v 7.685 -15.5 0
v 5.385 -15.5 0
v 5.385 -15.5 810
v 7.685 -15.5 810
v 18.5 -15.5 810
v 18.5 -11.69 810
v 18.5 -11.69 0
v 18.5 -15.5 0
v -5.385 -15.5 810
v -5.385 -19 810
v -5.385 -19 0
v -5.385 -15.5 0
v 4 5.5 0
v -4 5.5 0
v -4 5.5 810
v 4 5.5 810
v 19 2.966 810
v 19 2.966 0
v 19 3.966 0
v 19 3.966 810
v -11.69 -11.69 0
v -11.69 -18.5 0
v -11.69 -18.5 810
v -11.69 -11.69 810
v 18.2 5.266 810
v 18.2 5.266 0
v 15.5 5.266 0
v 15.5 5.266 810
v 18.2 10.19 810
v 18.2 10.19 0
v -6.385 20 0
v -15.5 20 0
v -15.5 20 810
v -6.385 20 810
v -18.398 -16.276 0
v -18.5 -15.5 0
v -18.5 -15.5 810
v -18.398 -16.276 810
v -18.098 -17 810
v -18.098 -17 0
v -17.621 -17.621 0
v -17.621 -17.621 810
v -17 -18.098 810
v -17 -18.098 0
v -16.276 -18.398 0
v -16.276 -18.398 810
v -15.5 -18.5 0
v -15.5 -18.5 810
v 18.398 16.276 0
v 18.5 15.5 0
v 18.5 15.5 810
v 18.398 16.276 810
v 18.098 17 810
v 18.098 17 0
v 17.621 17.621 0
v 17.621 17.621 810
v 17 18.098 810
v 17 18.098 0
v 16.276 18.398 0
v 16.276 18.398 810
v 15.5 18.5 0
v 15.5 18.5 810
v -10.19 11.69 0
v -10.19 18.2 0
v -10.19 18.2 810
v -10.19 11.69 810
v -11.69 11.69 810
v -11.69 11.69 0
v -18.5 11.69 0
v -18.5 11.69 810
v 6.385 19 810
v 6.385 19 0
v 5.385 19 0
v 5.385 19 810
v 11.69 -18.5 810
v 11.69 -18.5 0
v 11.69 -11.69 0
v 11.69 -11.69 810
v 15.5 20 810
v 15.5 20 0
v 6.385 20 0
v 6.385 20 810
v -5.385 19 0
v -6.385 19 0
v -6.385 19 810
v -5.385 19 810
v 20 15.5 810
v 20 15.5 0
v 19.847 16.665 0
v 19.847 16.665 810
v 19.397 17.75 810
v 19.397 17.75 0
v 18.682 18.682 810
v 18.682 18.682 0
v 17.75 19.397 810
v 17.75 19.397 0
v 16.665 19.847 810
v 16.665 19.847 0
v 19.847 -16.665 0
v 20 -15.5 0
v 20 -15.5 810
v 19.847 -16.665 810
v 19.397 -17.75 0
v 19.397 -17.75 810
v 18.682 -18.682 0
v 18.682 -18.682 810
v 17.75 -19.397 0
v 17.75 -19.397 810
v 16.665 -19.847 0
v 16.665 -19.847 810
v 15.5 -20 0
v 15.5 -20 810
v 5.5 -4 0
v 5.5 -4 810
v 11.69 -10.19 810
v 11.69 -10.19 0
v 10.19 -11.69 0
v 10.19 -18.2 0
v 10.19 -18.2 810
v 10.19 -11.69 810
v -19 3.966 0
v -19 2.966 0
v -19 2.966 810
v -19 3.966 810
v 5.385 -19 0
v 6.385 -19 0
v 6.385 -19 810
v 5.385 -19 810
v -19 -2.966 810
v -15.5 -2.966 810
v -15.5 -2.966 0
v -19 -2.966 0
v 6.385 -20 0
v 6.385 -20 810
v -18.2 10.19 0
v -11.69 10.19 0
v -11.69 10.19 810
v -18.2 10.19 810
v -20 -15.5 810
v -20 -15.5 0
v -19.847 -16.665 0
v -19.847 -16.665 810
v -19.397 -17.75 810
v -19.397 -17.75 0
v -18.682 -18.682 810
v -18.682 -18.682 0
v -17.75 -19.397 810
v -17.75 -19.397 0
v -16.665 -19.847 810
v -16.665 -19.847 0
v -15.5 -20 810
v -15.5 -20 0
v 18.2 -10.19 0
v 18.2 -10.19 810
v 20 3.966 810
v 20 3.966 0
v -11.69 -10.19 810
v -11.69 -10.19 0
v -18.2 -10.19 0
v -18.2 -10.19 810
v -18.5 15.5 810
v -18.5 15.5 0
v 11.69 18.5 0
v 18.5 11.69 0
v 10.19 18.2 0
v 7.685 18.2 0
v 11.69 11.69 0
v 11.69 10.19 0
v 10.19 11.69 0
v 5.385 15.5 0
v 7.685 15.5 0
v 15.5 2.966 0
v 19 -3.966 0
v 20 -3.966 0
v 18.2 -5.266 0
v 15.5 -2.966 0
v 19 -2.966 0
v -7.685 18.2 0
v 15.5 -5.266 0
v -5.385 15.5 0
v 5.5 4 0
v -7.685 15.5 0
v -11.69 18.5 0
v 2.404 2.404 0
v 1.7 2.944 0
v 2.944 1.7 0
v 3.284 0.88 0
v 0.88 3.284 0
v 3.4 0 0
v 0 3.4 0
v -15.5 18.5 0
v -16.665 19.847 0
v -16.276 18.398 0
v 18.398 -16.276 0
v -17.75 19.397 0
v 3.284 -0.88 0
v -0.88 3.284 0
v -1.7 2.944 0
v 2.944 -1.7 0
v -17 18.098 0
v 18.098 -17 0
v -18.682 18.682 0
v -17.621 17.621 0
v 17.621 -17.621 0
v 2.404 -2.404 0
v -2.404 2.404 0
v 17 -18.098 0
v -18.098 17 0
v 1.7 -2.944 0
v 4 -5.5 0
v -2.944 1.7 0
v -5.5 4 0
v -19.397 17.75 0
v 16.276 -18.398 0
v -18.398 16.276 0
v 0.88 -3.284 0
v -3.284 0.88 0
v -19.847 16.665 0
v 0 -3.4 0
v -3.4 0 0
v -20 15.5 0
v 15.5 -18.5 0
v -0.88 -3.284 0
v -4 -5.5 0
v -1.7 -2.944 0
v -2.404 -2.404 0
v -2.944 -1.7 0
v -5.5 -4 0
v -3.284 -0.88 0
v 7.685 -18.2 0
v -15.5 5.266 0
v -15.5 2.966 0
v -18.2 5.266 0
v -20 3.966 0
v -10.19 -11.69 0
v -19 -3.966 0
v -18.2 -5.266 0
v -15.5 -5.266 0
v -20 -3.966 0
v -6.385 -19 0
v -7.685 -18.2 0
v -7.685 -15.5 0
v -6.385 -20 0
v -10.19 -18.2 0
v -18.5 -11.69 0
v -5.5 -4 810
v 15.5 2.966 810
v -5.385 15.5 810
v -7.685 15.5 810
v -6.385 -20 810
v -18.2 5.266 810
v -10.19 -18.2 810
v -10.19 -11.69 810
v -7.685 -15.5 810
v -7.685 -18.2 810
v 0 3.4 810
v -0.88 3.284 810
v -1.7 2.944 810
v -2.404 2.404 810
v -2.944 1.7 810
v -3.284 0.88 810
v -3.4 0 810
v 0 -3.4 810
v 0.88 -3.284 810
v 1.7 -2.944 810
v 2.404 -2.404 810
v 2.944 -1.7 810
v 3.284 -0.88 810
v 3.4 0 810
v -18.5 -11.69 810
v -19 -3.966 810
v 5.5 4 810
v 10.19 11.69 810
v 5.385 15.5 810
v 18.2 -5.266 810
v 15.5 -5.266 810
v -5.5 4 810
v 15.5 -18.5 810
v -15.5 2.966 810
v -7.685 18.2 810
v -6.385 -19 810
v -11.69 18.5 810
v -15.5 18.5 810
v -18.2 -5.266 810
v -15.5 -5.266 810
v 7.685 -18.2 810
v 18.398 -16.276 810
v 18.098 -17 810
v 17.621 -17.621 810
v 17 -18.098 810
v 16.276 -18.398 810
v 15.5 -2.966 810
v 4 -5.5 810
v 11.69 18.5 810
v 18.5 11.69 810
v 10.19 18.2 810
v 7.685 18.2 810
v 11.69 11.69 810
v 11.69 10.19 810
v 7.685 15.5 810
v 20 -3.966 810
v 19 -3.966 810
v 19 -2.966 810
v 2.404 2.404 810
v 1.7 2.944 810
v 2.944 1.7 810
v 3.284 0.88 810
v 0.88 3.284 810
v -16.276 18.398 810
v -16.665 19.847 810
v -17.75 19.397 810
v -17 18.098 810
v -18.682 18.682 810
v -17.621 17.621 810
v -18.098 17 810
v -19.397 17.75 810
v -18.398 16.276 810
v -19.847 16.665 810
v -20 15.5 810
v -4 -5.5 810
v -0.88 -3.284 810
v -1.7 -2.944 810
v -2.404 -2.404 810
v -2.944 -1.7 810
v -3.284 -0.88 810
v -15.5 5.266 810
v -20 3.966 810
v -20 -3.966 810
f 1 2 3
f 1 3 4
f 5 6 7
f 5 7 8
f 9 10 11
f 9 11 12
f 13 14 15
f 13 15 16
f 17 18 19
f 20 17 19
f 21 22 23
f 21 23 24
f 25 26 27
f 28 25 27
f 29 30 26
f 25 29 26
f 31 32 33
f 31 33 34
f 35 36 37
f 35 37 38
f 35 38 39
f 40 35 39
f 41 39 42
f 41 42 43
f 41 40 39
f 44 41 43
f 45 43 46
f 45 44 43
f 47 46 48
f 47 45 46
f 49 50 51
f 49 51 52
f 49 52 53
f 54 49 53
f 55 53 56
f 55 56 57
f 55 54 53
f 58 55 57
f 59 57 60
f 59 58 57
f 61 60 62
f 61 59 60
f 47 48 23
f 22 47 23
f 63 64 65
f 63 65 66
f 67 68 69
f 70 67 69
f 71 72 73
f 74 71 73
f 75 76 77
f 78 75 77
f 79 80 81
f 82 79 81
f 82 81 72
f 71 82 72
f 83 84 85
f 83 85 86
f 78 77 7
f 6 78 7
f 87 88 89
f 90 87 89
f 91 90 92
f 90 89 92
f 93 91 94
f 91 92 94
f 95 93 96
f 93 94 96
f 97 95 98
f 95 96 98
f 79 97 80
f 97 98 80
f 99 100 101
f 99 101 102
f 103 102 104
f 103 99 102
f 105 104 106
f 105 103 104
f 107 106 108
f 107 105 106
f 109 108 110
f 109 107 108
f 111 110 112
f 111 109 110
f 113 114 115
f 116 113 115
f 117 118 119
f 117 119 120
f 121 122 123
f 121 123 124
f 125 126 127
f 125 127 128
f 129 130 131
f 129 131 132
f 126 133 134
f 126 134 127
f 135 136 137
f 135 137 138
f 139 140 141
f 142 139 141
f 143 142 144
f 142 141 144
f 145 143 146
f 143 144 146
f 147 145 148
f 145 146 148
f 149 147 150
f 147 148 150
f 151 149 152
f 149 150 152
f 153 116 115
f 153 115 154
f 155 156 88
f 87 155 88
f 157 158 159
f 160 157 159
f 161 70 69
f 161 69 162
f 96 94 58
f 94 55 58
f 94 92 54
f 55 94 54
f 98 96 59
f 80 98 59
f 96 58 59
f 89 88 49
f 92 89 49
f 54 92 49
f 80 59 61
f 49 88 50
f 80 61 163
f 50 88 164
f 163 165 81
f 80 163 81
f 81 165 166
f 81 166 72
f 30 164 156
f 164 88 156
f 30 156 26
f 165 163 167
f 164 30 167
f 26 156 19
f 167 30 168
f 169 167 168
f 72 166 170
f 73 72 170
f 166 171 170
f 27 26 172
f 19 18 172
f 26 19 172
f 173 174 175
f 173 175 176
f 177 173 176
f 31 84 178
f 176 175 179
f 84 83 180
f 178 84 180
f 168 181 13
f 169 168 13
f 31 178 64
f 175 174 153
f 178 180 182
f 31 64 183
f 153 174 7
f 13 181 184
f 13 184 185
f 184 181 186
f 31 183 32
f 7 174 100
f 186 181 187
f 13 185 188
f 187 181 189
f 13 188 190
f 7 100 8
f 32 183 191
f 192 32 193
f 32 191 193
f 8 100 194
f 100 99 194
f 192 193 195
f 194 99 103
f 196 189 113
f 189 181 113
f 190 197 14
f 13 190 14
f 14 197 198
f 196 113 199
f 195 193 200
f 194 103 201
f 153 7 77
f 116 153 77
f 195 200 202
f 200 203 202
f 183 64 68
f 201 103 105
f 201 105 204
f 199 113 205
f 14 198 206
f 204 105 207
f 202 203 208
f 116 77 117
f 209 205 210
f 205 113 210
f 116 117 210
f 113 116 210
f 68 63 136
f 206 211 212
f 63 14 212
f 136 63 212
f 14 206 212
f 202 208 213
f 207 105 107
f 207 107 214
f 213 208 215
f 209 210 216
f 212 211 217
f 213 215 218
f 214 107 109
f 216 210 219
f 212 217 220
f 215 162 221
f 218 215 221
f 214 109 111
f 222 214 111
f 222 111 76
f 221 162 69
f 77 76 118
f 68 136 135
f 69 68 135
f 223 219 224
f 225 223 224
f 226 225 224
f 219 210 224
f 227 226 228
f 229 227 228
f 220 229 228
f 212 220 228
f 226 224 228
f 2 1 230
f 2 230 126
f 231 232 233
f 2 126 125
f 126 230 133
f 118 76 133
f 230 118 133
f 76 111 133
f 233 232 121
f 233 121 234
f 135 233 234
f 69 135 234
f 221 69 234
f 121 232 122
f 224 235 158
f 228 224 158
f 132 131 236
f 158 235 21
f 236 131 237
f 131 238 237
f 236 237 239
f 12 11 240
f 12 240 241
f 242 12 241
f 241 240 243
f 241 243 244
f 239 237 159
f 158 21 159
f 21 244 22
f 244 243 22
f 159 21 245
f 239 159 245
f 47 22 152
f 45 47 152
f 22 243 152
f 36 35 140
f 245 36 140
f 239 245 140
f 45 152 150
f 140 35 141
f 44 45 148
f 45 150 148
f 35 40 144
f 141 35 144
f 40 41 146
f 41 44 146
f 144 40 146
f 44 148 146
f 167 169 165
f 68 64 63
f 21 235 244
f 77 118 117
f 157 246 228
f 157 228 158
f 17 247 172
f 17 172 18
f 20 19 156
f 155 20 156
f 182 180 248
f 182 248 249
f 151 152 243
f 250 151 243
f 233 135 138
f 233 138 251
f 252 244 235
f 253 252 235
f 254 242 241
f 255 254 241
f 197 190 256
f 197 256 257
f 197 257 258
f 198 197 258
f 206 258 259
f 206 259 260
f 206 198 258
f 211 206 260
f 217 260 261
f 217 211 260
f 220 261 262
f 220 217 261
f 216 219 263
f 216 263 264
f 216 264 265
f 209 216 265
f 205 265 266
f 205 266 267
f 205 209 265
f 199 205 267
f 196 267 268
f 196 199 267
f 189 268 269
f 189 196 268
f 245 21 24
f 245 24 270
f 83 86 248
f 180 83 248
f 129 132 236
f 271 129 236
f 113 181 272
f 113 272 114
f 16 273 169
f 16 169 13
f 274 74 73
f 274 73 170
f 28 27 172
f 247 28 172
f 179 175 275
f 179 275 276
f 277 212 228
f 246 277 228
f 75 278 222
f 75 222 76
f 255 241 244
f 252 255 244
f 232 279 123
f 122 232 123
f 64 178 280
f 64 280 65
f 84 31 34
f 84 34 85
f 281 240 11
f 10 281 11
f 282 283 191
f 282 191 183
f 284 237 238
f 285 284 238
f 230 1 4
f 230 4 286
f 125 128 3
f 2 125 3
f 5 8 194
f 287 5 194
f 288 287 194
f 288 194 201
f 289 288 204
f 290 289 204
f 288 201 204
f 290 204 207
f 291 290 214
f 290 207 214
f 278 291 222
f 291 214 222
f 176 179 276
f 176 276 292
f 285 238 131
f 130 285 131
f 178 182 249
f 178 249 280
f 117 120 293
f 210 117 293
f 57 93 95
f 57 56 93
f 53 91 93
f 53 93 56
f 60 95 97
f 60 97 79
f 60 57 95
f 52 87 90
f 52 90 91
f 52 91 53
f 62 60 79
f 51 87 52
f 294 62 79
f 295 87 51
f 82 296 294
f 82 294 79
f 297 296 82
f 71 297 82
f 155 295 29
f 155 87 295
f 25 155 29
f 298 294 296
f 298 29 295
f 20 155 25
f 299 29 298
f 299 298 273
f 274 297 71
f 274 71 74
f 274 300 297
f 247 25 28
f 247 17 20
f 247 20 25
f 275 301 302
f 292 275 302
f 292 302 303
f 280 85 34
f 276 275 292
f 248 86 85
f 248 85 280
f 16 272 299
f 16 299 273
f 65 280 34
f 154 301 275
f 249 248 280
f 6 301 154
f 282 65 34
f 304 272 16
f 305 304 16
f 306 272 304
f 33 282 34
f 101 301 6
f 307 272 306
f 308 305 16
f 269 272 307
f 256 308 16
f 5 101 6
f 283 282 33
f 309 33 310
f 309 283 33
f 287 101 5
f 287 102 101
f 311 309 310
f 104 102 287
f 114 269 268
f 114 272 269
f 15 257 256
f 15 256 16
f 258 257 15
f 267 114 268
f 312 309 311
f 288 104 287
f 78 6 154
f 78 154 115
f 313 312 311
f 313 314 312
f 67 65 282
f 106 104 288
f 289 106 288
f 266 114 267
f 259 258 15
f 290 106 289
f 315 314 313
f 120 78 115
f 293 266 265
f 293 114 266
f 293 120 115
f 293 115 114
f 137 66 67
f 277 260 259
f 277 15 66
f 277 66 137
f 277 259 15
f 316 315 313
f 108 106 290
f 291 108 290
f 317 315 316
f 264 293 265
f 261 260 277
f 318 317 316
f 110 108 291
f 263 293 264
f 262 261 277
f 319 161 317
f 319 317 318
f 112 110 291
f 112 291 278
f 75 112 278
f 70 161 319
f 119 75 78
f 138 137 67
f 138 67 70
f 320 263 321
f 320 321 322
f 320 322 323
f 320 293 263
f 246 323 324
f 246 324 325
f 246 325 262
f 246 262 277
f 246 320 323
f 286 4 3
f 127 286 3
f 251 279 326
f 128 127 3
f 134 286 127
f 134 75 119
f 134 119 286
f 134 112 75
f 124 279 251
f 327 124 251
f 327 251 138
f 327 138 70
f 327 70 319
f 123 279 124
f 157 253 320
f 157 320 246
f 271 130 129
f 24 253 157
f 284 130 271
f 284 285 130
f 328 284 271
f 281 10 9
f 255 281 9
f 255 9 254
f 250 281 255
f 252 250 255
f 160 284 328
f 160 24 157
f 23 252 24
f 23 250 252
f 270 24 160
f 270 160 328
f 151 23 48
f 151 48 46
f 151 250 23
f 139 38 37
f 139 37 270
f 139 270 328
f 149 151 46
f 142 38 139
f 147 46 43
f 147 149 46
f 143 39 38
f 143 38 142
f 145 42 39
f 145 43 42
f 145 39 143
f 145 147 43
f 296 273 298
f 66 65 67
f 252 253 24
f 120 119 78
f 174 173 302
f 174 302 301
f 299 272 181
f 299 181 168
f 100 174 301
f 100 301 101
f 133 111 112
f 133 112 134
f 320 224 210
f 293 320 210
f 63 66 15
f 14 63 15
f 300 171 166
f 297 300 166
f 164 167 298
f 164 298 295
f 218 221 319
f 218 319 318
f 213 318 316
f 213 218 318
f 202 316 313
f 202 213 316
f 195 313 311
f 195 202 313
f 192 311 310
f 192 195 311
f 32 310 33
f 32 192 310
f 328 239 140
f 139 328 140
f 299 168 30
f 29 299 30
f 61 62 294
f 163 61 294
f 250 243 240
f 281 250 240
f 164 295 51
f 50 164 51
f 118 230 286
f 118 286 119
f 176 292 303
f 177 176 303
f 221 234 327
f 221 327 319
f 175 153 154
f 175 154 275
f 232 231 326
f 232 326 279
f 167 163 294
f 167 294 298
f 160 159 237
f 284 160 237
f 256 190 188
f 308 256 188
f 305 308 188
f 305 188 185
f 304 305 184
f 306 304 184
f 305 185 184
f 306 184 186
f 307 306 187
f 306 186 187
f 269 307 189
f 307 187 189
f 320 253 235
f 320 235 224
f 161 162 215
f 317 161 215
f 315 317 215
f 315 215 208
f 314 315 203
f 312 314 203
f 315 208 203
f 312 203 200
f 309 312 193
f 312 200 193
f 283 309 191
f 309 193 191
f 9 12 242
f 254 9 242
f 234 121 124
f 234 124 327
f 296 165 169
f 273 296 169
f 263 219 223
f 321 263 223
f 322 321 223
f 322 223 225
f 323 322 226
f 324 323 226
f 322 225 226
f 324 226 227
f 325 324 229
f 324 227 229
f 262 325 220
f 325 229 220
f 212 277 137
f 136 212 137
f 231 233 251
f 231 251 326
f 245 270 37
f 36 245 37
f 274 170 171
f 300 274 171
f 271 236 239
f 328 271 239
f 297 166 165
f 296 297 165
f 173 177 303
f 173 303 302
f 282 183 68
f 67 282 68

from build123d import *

# Parameters (mm, degrees)
BOSS_EXTRUDE1_DEPTH  = 810
MIRROR3_COPY_1_DEPTH = 810
MIRROR3_COPY_2_DEPTH = 810


with BuildPart() as part:
    # Sketch1 → Boss-Extrude1 (new body)
    with BuildSketch(Plane.XY):
        with BuildLine():
            Line((3.4, 0), (5.5, 0))
            Line((5.5, 0), (5.5, 4))
            Line((5.5, 4), (11.69, 10.19))
            Line((11.69, 10.19), (18.2, 10.19))
            Line((18.2, 10.19), (18.2, 5.265595036))
            Line((18.2, 5.265595036), (15.5, 5.265595036))
            Line((15.5, 5.265595036), (15.5, 2.965595036))
            Line((15.5, 2.965595036), (19, 2.965595036))
            Line((19, 2.965595036), (19, 3.965595036))
            Line((19, 3.965595036), (20, 3.965595036))
            Line((20, 3.965595036), (20, 15.5))
            ThreePointArc((20, 15.5), (18.681980515, 18.681980515), (15.5, 20))
            Line((15.5, 20), (6.385304712, 20))
            Line((6.385304712, 20), (6.385304712, 19))
            Line((6.385304712, 19), (5.385304712, 19))
            Line((5.385304712, 19), (5.385304712, 15.5))
            Line((5.385304712, 15.5), (7.685304712, 15.5))
            Line((7.685304712, 15.5), (7.685304712, 18.2))
            Line((7.685304712, 18.2), (10.19, 18.2))
            Line((10.19, 18.2), (10.19, 11.69))
            Line((10.19, 11.69), (4, 5.5))
            Line((4, 5.5), (0, 5.5))
            Line((0, 5.5), (0, 3.4))
            ThreePointArc((0, 3.4), (2.404163056, 2.404163056), (3.4, 0))
        make_face()
        with BuildLine():
            Line((18.5, 11.69), (18.5, 15.5))
            ThreePointArc((18.5, 15.5), (17.621320344, 17.621320344), (15.5, 18.5))
            Line((15.5, 18.5), (11.69, 18.5))
            Line((11.69, 18.5), (11.69, 11.69))
            Line((11.69, 11.69), (18.5, 11.69))
        make_face(mode=Mode.SUBTRACT)
    boss_extrude1 = extrude(amount=BOSS_EXTRUDE1_DEPTH)

    # Mirror1: Boss-Extrude1 across plane
    add(boss_extrude1.mirror(Plane.ZX))

    # Mirror2: Boss-Extrude1 across plane
    add(boss_extrude1.mirror(Plane(origin=(0, 0, 0), x_dir=(0, 0, 1), z_dir=(1, 0, 0))))

    # Mirror3 copy 1 sketch → Mirror3 copy 1 (add)
    with BuildSketch(Plane(origin=(0, 0, 0), x_dir=(-1, 0, 0), z_dir=(0, 0, 1))):
        with BuildLine():
            Line((3.4, 0), (5.5, 0))
            Line((5.5, 0), (5.5, 4))
            Line((5.5, 4), (11.69, 10.19))
            Line((11.69, 10.19), (18.2, 10.19))
            Line((18.2, 10.19), (18.2, 5.265595036))
            Line((18.2, 5.265595036), (15.5, 5.265595036))
            Line((15.5, 5.265595036), (15.5, 2.965595036))
            Line((15.5, 2.965595036), (19, 2.965595036))
            Line((19, 2.965595036), (19, 3.965595036))
            Line((19, 3.965595036), (20, 3.965595036))
            Line((20, 3.965595036), (20, 15.5))
            ThreePointArc((20, 15.5), (18.681980515, 18.681980515), (15.5, 20))
            Line((15.5, 20), (6.385304712, 20))
            Line((6.385304712, 20), (6.385304712, 19))
            Line((6.385304712, 19), (5.385304712, 19))
            Line((5.385304712, 19), (5.385304712, 15.5))
            Line((5.385304712, 15.5), (7.685304712, 15.5))
            Line((7.685304712, 15.5), (7.685304712, 18.2))
            Line((7.685304712, 18.2), (10.19, 18.2))
            Line((10.19, 18.2), (10.19, 11.69))
            Line((10.19, 11.69), (4, 5.5))
            Line((4, 5.5), (0, 5.5))
            Line((0, 5.5), (0, 3.4))
            ThreePointArc((0, 3.4), (2.404163056, 2.404163056), (3.4, 0))
        make_face()
        with BuildLine():
            Line((18.5, 11.69), (18.5, 15.5))
            ThreePointArc((18.5, 15.5), (17.621320344, 17.621320344), (15.5, 18.5))
            Line((15.5, 18.5), (11.69, 18.5))
            Line((11.69, 18.5), (11.69, 11.69))
            Line((11.69, 11.69), (18.5, 11.69))
        make_face(mode=Mode.SUBTRACT)
    extrude(amount=MIRROR3_COPY_1_DEPTH)

    # Mirror3 copy 2 sketch → Mirror3 copy 2 (add)
    with BuildSketch(Plane.XY):
        with BuildLine():
            Line((3.4, 0), (5.5, 0))
            Line((5.5, 0), (5.5, -4))
            Line((5.5, -4), (11.69, -10.19))
            Line((11.69, -10.19), (18.2, -10.19))
            Line((18.2, -10.19), (18.2, -5.265595036))
            Line((18.2, -5.265595036), (15.5, -5.265595036))
            Line((15.5, -5.265595036), (15.5, -2.965595036))
            Line((15.5, -2.965595036), (19, -2.965595036))
            Line((19, -2.965595036), (19, -3.965595036))
            Line((19, -3.965595036), (20, -3.965595036))
            Line((20, -3.965595036), (20, -15.5))
            ThreePointArc((20, -15.5), (18.681980515, -18.681980515), (15.5, -20))
            Line((15.5, -20), (6.385304712, -20))
            Line((6.385304712, -20), (6.385304712, -19))
            Line((6.385304712, -19), (5.385304712, -19))
            Line((5.385304712, -19), (5.385304712, -15.5))
            Line((5.385304712, -15.5), (7.685304712, -15.5))
            Line((7.685304712, -15.5), (7.685304712, -18.2))
            Line((7.685304712, -18.2), (10.19, -18.2))
            Line((10.19, -18.2), (10.19, -11.69))
            Line((10.19, -11.69), (4, -5.5))
            Line((4, -5.5), (0, -5.5))
            Line((0, -5.5), (0, -3.4))
            ThreePointArc((0, -3.4), (2.404163056, -2.404163056), (3.4, 0))
        make_face()
        with BuildLine():
            Line((18.5, -11.69), (18.5, -15.5))
            ThreePointArc((18.5, -15.5), (17.621320344, -17.621320344), (15.5, -18.5))
            Line((15.5, -18.5), (11.69, -18.5))
            Line((11.69, -18.5), (11.69, -11.69))
            Line((11.69, -11.69), (18.5, -11.69))
        make_face(mode=Mode.SUBTRACT)
    extrude(amount=MIRROR3_COPY_2_DEPTH)


solid = part.part
